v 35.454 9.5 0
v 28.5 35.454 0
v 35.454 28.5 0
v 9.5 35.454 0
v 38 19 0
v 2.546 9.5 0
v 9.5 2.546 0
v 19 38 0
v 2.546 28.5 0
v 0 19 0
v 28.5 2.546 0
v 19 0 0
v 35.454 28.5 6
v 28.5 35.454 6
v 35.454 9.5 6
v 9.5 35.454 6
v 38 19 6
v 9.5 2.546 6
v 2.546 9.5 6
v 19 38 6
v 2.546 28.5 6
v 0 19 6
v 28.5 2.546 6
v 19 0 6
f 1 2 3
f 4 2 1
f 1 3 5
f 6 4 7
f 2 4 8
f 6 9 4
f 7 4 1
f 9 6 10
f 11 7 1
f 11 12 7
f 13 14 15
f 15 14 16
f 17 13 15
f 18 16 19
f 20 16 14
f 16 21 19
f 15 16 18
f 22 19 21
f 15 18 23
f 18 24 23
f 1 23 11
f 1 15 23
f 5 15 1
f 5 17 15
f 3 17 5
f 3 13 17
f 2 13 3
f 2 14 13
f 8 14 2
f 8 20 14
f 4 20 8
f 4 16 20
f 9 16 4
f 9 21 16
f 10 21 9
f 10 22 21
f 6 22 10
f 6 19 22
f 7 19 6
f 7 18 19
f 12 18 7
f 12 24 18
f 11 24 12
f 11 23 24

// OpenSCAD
$fn = 32;

// ----------------------------------------------------------------------
// Eccentric disc: egg, 6 mm thick
// ----------------------------------------------------------------------

// --- parameters (mm) ---
profile_height = 6;       // extrusion height
profile_points = 12;      // points of the closed outline

profile = [[0, 19], [2.546, 9.5], [9.5, 2.546], [19, 0], [28.5, 2.546], [35.454, 9.5], [38, 19], [35.454, 28.5], [28.5, 35.454], [19, 38], [9.5, 35.454], [2.546, 28.5]];  // single closed polygon, 12 points, counter clockwise

// --- the one profile operation ---
linear_extrude(height = profile_height) polygon(points = profile);
